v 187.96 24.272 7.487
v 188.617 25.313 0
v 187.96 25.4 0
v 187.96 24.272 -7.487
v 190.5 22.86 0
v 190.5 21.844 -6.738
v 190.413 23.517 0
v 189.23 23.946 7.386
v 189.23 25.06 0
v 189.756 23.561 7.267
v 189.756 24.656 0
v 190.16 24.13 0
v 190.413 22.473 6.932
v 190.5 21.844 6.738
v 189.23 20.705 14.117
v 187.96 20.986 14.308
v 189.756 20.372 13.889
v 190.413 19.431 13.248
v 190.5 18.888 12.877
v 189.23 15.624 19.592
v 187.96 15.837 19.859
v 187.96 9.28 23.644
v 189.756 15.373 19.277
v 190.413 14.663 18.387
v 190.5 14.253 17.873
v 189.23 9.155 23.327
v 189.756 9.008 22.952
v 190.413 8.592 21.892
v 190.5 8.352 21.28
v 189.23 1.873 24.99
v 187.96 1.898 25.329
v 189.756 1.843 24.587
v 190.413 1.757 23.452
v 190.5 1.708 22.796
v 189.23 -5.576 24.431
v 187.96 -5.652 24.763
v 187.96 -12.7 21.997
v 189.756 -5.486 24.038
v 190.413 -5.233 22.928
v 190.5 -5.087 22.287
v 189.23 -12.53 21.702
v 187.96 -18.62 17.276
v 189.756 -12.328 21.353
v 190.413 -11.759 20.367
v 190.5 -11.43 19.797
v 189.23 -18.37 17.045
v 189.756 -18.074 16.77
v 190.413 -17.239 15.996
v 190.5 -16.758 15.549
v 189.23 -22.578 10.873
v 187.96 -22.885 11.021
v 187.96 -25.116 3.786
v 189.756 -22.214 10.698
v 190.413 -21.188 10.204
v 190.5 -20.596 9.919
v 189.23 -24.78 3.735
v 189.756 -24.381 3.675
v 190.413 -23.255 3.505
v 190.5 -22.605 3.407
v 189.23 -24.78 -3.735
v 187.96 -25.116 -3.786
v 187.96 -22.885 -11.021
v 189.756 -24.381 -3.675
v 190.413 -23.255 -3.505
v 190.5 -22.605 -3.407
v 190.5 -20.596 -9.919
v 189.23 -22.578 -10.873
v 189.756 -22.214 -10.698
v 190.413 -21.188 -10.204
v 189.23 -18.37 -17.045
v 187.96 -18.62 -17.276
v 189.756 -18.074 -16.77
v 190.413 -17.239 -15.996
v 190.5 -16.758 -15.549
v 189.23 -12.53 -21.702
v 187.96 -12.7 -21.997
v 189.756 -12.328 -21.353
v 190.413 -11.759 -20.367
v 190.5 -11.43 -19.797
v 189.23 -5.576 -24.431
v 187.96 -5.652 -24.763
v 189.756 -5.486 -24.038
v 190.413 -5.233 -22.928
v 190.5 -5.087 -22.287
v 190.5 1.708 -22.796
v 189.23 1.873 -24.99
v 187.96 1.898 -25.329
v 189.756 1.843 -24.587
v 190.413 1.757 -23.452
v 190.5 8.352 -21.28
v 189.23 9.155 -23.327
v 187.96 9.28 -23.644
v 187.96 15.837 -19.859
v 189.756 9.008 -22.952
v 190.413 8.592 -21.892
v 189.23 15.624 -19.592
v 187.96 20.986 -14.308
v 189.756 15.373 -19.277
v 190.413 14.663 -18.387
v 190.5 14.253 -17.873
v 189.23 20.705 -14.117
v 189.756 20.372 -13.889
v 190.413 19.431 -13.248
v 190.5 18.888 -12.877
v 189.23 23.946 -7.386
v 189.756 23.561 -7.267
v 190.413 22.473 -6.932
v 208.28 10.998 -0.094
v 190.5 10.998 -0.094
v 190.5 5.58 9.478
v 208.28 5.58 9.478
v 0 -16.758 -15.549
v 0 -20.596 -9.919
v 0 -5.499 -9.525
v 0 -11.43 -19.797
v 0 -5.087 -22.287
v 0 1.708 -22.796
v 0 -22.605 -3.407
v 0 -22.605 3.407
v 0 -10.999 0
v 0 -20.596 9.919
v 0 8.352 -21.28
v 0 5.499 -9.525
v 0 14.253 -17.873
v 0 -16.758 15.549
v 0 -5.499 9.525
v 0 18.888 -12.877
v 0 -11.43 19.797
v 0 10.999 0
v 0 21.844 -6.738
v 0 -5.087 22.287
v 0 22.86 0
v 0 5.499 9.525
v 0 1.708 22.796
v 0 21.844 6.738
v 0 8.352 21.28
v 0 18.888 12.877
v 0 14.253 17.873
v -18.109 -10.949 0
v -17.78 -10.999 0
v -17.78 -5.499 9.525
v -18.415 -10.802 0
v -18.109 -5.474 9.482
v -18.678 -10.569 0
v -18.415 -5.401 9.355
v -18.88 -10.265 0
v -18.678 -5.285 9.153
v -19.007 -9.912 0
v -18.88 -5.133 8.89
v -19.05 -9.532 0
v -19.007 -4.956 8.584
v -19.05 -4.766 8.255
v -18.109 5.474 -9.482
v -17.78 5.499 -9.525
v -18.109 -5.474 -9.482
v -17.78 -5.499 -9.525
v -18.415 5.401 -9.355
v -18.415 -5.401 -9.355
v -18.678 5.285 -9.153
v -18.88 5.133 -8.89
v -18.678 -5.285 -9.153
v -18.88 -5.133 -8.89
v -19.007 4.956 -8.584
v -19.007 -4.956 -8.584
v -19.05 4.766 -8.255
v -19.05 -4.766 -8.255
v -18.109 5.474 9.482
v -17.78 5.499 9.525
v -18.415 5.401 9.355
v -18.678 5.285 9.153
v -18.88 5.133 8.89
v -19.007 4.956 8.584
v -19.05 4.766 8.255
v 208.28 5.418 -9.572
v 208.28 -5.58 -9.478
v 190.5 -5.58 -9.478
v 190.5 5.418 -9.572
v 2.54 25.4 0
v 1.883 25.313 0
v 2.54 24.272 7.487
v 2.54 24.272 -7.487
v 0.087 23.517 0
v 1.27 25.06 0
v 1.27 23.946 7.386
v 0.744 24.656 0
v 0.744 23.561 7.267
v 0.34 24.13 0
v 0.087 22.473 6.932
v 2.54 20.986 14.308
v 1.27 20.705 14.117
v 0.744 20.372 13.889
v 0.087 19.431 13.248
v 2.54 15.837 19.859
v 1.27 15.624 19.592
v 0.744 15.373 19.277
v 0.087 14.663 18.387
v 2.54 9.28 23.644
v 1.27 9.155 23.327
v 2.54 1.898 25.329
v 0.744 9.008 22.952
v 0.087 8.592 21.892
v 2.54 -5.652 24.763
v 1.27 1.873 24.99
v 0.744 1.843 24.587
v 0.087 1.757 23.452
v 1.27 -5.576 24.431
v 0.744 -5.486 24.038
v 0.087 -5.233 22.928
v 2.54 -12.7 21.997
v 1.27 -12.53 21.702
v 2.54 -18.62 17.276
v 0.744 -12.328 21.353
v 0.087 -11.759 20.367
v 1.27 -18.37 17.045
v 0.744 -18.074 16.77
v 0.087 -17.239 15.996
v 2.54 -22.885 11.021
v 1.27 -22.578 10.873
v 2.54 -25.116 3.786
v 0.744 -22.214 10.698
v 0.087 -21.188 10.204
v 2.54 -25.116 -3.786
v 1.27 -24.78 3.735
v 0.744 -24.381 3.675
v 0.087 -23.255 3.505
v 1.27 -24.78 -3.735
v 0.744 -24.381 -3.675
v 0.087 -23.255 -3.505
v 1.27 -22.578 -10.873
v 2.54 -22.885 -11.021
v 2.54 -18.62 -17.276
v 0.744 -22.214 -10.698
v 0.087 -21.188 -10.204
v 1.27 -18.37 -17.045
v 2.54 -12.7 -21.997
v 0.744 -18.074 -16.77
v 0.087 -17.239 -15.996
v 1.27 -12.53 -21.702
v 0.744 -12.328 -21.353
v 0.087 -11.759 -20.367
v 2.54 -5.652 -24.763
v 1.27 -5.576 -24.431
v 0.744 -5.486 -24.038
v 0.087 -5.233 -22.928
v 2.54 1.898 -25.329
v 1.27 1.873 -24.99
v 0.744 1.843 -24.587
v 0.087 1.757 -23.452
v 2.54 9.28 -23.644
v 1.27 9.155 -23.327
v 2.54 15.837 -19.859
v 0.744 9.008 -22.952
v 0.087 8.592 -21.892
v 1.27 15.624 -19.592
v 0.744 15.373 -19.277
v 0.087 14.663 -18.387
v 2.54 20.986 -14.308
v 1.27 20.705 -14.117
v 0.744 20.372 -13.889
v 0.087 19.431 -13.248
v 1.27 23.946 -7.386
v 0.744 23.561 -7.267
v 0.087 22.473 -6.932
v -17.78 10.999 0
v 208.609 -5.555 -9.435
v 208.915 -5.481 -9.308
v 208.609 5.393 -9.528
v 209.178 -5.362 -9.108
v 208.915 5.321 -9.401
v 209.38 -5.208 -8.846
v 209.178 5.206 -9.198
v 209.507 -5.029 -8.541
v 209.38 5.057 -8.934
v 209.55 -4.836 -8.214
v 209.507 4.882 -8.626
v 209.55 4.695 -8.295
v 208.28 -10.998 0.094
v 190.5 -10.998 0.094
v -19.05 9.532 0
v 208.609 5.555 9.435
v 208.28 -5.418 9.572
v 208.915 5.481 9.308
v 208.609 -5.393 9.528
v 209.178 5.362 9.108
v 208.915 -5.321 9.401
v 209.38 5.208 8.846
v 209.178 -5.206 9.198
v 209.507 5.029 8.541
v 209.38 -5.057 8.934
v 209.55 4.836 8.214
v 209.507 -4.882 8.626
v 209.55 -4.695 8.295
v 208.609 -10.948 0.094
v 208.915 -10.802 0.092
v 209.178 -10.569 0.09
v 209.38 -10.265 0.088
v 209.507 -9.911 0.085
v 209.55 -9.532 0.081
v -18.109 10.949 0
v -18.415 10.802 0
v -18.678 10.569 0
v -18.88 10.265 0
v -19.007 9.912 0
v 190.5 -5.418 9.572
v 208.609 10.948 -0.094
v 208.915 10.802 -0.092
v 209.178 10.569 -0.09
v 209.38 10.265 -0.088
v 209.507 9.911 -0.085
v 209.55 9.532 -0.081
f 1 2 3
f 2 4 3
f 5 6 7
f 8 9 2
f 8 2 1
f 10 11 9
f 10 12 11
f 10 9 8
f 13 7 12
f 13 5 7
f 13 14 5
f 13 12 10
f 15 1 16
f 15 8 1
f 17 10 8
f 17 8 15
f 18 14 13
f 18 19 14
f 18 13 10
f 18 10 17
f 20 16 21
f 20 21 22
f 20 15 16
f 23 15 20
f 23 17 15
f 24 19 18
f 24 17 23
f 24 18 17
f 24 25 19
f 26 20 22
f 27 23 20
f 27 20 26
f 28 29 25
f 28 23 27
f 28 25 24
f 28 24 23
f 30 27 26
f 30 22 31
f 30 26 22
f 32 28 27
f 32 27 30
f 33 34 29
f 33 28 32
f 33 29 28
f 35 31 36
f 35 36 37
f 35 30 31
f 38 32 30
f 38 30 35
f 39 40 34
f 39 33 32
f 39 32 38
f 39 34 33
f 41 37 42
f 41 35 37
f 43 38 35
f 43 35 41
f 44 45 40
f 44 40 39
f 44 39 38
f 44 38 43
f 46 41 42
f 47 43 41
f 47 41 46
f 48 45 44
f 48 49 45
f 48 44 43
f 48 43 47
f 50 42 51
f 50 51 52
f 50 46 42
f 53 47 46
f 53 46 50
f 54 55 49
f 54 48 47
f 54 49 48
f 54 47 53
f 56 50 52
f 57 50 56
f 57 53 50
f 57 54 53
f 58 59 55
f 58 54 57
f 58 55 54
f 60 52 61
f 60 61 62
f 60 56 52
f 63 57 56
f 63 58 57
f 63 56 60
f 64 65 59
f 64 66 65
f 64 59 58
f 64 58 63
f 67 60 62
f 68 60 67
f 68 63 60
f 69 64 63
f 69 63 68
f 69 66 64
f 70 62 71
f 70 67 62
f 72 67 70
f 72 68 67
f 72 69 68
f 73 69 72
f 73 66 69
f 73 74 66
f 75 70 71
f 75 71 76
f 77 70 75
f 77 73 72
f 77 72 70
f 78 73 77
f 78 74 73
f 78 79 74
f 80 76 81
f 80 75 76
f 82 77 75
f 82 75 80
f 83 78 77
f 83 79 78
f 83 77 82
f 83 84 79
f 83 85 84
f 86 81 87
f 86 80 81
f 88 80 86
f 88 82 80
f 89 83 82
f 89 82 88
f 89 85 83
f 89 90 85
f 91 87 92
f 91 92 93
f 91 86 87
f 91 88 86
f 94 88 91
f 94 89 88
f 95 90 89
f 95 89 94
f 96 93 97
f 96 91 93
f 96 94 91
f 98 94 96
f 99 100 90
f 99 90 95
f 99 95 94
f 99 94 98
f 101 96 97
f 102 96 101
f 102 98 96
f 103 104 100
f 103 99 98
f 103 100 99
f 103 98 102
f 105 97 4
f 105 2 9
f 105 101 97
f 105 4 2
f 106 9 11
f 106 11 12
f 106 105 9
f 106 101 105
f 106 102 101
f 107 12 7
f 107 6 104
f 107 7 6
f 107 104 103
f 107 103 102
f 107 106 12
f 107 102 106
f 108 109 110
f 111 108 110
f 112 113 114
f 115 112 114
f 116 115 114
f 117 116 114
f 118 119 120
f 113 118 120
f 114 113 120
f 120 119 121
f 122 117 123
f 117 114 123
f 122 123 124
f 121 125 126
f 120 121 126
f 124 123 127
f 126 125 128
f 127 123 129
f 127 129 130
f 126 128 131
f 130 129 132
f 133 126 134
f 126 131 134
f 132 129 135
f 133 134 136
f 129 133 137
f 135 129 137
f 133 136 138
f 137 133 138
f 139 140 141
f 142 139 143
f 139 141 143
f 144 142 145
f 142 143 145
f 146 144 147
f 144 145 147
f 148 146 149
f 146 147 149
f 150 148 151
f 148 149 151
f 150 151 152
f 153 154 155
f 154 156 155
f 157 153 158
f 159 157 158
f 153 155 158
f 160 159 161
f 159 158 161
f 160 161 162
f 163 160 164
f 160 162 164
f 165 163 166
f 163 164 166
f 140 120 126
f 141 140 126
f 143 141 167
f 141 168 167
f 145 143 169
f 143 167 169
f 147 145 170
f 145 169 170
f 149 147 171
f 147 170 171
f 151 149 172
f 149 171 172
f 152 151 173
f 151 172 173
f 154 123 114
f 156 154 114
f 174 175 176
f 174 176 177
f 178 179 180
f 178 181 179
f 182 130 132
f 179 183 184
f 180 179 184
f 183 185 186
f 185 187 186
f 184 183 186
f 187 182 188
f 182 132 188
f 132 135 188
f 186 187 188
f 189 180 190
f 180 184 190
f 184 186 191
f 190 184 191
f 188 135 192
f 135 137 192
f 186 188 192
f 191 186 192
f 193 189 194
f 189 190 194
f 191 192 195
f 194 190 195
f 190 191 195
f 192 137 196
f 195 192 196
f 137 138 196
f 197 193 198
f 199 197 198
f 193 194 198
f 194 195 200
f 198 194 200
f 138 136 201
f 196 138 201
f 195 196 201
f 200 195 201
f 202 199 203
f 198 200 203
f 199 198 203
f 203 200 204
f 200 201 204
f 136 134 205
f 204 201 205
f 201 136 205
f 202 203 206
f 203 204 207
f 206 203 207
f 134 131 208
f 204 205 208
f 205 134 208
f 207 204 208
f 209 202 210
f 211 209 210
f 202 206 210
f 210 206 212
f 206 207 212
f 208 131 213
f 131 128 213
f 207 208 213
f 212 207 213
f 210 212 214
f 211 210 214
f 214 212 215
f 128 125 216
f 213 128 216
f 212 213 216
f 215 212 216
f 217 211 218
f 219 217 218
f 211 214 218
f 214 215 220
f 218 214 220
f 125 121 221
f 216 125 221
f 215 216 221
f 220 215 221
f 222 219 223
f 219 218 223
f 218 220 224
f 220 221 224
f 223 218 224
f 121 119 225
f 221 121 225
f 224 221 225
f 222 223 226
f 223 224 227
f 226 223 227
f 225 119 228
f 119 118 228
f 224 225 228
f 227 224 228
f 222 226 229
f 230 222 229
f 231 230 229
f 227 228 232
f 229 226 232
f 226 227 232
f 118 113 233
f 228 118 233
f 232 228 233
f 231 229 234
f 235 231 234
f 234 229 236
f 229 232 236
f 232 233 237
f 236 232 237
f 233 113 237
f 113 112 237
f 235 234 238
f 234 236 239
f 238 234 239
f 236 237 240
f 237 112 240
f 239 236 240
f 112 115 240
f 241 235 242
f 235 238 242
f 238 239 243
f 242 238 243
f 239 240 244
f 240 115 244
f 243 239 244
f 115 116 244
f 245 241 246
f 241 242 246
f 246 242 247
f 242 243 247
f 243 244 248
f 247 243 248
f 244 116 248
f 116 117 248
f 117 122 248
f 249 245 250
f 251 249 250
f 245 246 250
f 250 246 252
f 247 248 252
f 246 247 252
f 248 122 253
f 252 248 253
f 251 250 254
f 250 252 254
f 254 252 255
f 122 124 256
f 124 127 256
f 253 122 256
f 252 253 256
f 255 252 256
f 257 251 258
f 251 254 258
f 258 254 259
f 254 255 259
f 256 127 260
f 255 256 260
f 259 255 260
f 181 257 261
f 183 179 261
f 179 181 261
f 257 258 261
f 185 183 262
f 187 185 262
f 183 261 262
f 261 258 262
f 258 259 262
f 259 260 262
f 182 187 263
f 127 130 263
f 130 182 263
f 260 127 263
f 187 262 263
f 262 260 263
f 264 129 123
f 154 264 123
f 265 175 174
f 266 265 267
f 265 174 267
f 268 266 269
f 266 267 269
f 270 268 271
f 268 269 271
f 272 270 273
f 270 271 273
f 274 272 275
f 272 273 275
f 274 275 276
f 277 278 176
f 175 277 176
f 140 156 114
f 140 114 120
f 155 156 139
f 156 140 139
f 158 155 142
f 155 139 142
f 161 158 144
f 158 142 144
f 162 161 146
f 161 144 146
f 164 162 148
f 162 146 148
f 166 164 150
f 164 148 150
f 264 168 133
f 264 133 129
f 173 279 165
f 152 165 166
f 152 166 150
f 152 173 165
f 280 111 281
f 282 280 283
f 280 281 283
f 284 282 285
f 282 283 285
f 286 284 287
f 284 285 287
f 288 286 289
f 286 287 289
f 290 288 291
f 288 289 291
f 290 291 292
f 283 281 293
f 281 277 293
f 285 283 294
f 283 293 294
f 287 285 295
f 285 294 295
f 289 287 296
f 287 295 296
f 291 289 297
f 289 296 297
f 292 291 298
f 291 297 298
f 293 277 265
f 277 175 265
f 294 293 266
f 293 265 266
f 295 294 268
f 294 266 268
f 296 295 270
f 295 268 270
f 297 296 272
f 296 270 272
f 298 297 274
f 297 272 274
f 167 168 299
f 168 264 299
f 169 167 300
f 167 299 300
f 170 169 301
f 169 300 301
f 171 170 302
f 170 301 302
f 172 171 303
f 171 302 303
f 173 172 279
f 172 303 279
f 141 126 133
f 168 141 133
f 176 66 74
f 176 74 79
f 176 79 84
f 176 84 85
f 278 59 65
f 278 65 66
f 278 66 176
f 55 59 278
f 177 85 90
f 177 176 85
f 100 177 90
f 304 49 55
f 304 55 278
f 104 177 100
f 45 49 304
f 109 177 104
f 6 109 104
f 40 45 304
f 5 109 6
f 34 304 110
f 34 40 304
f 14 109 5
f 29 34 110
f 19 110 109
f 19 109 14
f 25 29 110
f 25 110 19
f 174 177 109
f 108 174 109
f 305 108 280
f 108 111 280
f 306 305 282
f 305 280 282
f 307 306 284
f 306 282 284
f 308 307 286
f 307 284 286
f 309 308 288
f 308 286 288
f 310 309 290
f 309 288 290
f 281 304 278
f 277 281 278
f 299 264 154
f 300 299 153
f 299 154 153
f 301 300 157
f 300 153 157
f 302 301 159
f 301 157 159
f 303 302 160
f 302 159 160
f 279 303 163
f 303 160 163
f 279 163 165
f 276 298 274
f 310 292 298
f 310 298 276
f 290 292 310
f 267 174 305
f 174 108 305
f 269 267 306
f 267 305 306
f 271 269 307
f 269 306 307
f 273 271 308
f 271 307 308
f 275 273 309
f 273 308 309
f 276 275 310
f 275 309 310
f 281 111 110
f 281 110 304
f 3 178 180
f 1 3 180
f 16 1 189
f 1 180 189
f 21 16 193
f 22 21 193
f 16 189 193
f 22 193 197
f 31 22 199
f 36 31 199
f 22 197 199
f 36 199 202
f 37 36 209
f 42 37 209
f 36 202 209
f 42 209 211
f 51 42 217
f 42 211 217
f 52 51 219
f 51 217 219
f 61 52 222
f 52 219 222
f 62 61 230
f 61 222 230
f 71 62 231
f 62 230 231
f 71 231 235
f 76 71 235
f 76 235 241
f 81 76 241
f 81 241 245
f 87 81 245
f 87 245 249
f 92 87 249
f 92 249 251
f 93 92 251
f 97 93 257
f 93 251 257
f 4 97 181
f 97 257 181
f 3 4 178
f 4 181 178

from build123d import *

# Parameters (mm, degrees)
F0_R     = 25.4
F1_DEPTH = 190.5
F3_DEPTH = 19.05
F5_DEPTH = 19.05
F6_R     = 2.54
F7_R     = 2.54
F8_R     = 1.27
F9_R     = 1.27


with BuildPart() as f1:
    # F0 (on Right) → F1 (new body)
    with BuildSketch(Plane.YZ):
        Circle(F0_R)
    extrude(amount=F1_DEPTH)

    # F2 (on face) → F3 (join)
    with BuildSketch(Plane(origin=(0, 0, 0), x_dir=(0, -1, 0), z_dir=(-1, 0, 0))):
        Polygon((5.499261, 9.525), (-5.499261, 9.525), (-10.998523, 0), (-5.499261, -9.525), (5.499261, -9.525), (10.998523, 0), align=None)
    extrude(amount=F3_DEPTH)

    # F4 (on face) → F5 (join)
    with BuildSketch(Plane.YZ.offset(190.5)):
        Polygon((10.998121, -0.093942), (5.580416, 9.477682), (-5.417705, 9.571623), (-10.998121, 0.093942), (-5.580416, -9.477682), (5.417705, -9.571623), align=None)
    extrude(amount=F5_DEPTH)

    # F6
    f6_edges = [f1.edges().sort_by_distance(p)[0] for p in [
        (190.5, -25.4, 0),
    ]]
    fillet(f6_edges, radius=F6_R)

    # F7
    f7_edges = [f1.edges().sort_by_distance(p)[0] for p in [
        (0, -25.4, 0),
    ]]
    fillet(f7_edges, radius=F7_R)

    # F8
    f8_edges = [f1.edges().sort_by_distance(p)[0] for p in [
        (209.55, 8.289269, 4.69187),
        (209.55, 0.081356, 9.524653),
        (209.55, -8.207913, 4.832782),
        (209.55, -8.289269, -4.69187),
        (209.55, -0.081356, -9.524653),
        (209.55, 8.207913, -4.832782),
    ]]
    fillet(f8_edges, radius=F8_R)

    # F9
    f9_edges = [f1.edges().sort_by_distance(p)[0] for p in [
        (-19.05, 0, 9.525),
        (-19.05, 8.248892, 4.7625),
        (-19.05, 8.248892, -4.7625),
        (-19.05, 0, -9.525),
        (-19.05, -8.248892, -4.7625),
        (-19.05, -8.248892, 4.7625),
    ]]
    fillet(f9_edges, radius=F9_R)


solid = f1.part
